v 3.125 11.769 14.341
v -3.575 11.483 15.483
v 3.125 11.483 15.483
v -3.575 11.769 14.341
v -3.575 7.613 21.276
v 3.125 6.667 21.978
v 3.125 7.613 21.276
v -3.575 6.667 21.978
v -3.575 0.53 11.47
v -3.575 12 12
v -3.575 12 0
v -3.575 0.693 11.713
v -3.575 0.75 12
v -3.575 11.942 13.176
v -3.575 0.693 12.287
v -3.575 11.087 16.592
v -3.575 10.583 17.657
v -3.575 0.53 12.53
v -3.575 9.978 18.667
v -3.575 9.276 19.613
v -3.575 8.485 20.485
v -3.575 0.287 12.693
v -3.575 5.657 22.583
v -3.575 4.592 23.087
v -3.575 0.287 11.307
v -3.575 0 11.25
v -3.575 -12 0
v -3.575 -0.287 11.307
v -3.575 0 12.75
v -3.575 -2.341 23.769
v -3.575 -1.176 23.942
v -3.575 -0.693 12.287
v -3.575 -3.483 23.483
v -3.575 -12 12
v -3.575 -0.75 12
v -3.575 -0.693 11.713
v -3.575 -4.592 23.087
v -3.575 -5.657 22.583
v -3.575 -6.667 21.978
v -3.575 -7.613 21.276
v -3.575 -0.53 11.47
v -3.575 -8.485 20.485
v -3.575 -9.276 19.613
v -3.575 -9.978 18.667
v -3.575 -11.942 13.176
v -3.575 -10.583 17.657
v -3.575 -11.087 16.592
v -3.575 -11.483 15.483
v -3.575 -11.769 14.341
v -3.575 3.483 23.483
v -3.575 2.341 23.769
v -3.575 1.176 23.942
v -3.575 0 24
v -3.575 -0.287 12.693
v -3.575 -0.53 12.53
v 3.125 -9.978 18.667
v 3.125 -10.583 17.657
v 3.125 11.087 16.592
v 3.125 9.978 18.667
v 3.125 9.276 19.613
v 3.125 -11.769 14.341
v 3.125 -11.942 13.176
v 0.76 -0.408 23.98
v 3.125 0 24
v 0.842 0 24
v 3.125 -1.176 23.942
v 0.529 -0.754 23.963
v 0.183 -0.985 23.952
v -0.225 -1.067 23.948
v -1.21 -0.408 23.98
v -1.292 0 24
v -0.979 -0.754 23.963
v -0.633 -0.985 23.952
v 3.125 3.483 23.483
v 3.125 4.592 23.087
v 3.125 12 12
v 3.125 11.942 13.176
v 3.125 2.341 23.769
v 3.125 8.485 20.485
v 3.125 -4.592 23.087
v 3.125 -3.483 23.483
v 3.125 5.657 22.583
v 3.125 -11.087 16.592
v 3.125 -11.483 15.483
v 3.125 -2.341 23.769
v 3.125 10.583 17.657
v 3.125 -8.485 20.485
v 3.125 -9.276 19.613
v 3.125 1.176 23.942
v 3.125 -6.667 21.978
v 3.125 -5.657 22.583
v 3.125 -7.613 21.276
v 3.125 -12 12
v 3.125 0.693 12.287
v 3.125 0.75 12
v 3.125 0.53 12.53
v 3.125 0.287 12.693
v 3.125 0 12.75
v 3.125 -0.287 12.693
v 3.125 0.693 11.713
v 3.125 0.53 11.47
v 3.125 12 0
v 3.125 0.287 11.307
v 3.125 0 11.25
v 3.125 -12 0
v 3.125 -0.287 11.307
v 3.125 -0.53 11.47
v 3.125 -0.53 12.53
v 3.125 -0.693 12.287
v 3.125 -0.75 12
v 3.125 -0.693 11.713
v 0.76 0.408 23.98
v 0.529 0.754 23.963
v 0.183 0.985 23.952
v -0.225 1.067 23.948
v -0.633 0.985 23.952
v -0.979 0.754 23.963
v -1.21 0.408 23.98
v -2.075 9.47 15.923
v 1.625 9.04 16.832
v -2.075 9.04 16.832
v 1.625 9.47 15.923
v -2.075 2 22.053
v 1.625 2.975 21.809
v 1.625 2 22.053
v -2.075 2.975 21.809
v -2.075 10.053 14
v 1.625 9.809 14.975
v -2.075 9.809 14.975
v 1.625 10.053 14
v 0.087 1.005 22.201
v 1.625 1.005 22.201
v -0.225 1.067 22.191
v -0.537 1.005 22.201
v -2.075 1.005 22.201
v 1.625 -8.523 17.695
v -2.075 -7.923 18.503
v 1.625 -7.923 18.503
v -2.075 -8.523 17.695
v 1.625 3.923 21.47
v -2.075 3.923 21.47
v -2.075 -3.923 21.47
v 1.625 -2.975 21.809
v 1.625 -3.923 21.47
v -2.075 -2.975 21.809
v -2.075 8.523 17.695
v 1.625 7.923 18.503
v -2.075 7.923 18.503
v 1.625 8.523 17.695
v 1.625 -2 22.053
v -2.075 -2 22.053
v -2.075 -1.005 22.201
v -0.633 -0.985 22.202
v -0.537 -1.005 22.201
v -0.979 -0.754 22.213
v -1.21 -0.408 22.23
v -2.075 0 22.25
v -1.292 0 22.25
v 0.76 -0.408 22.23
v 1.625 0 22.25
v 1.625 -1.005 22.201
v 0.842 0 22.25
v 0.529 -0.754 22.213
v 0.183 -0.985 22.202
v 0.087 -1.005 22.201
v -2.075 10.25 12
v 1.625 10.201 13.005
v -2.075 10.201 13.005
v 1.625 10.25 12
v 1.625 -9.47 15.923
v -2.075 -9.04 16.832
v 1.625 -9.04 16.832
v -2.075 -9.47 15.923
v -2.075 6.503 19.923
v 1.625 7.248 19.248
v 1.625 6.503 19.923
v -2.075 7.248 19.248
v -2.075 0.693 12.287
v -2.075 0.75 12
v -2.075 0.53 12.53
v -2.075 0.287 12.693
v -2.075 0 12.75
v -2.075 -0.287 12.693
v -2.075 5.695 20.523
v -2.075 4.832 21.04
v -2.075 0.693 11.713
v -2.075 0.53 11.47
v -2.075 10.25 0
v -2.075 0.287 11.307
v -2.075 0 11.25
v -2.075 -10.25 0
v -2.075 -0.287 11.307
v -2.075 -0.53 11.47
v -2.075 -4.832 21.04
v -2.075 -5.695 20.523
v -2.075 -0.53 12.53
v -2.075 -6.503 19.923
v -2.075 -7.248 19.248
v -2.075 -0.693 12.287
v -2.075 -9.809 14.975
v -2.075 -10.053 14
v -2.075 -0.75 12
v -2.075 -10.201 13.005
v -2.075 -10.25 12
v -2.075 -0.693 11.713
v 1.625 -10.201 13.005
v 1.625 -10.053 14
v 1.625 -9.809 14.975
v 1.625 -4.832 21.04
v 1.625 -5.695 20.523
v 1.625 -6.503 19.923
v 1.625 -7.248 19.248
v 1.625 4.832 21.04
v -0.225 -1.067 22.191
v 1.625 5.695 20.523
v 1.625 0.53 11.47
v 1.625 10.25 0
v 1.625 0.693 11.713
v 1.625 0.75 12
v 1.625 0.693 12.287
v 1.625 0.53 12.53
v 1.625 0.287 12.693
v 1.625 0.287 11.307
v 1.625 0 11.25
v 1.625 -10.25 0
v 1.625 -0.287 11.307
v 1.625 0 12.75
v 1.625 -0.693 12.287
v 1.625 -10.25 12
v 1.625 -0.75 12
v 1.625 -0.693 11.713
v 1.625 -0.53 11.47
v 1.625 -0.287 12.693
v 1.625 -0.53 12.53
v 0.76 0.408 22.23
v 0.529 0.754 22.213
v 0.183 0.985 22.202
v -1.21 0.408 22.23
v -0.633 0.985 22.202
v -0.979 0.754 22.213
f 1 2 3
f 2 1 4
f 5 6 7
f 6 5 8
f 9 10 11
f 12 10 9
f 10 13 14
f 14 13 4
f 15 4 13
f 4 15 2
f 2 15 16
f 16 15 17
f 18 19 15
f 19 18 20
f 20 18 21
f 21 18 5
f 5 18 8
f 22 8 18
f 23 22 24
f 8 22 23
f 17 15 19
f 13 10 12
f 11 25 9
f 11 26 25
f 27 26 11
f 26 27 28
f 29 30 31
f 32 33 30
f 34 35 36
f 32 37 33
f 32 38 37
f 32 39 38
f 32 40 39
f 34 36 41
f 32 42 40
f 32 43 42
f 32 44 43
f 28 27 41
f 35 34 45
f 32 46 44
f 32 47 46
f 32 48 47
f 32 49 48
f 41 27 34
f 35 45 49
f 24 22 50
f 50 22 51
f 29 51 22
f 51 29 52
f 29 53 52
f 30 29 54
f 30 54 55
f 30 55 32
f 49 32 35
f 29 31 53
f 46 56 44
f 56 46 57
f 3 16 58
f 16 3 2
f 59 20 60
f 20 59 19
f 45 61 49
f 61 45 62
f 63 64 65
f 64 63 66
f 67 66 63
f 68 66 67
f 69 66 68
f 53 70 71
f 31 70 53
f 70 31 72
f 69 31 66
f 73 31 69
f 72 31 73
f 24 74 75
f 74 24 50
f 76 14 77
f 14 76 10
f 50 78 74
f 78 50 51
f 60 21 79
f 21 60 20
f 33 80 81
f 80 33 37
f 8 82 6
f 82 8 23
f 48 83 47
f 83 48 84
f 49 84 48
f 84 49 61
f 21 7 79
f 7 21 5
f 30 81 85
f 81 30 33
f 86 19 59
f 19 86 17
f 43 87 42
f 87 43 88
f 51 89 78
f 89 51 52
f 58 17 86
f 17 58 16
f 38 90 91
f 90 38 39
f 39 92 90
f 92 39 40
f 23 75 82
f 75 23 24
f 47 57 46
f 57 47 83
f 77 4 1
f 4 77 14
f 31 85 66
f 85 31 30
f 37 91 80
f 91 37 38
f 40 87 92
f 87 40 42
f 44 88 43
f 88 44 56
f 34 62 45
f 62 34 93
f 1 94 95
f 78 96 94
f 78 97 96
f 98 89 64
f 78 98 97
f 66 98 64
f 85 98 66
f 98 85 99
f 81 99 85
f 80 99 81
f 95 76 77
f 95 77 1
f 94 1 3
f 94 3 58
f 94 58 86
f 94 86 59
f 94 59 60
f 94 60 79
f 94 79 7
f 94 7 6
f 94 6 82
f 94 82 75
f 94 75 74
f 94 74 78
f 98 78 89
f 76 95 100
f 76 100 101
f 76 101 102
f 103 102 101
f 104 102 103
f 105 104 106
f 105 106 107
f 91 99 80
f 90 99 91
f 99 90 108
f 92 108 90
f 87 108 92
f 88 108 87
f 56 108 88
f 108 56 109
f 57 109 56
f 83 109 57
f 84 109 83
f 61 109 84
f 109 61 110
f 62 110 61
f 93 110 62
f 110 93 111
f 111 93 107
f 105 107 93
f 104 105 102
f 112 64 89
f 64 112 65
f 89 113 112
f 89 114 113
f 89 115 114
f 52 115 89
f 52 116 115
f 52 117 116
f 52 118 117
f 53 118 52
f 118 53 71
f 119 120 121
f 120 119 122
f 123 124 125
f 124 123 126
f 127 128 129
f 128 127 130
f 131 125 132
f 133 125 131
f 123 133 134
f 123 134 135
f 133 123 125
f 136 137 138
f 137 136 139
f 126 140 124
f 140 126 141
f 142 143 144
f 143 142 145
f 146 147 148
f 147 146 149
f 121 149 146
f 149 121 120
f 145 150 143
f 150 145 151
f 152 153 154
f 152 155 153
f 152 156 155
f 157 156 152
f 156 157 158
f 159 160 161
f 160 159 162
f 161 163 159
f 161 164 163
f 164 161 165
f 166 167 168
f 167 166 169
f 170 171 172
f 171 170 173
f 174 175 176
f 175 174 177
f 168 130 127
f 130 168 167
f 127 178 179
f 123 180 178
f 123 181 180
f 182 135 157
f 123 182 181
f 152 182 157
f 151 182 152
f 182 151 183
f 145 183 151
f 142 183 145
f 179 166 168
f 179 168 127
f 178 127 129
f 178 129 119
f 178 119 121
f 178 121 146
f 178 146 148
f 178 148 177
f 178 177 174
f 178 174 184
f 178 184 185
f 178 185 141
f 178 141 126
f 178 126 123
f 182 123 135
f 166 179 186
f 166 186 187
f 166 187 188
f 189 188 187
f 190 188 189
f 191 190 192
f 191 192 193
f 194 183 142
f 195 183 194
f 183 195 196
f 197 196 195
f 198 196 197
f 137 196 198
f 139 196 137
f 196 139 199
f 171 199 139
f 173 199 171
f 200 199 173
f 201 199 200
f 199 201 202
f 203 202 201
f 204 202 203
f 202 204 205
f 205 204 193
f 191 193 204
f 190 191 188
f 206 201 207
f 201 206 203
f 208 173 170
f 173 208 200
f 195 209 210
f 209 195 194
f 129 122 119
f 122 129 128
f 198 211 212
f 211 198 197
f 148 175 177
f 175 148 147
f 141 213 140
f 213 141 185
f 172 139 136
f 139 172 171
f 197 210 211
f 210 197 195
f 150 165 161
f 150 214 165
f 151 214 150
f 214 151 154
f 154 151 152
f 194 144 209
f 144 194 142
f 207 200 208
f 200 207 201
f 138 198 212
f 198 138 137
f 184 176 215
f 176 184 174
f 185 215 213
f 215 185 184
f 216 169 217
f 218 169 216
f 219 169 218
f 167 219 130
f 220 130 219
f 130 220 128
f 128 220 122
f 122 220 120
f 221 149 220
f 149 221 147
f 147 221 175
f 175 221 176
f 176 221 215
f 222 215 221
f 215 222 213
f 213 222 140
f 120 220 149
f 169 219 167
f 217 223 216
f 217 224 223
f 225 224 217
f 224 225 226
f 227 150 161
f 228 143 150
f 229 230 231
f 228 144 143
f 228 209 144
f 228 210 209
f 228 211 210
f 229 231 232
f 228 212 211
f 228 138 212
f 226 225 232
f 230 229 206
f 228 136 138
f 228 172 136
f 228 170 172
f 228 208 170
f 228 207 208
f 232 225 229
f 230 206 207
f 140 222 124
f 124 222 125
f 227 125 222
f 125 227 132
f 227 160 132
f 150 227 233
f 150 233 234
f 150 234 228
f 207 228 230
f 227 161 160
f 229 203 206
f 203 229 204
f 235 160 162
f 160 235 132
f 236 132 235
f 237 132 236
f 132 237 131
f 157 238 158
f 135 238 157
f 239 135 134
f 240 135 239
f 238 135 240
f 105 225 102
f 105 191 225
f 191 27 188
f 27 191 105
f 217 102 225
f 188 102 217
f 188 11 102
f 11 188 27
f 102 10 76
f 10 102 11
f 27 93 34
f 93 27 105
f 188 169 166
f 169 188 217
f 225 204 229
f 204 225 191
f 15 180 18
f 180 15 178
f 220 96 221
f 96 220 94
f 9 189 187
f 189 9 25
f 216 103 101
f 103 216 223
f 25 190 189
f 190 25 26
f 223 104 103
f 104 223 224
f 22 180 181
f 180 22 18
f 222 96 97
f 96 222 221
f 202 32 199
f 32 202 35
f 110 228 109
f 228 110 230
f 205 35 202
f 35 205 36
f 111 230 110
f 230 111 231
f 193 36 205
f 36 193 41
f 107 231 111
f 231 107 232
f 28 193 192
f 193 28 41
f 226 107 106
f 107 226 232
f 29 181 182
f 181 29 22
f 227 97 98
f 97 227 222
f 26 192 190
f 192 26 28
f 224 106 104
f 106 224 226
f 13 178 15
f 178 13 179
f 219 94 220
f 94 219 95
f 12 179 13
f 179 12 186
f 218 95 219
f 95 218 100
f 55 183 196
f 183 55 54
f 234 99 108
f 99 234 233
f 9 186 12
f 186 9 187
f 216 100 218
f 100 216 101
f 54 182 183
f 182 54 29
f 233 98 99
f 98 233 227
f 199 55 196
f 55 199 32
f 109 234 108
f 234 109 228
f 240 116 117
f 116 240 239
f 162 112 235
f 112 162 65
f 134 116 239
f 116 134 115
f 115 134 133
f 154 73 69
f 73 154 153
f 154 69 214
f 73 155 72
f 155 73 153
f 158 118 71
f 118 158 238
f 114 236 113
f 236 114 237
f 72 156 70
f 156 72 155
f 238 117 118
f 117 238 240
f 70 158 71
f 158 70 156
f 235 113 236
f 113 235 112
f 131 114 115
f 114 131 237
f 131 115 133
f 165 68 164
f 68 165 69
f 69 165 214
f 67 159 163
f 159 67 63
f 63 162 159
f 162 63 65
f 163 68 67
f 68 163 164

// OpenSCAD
/*Battery dimensions in mm
CR1225 cell holder: 
 diameter=12mm 
 height=2.5mm 
 tolerance=0.5mm 
 wall thickness=2mm 

CR2032 cell holder: 
 diameter=20mm 
 height=3.2mm 
 tolerance=0.5mm 
 wall thickness=2mm 
*/

battery_diameter	=20.0;	// Diameter of battery
battery_height		=3.2;	// Thickness of battery
tolerance			=0.5;	// Make things a little looser
wall_thickness		=1.5;	// Wall thickness
wire_diameter		=1.5;	// Thickness of wire openings
extra_length		=2.0;	// Extends the open outwards to "hide" the battery a little bit
number_of_cells	=1;		// How many cells will be stacked

rotate([0,90,0])
{
	// Move to propper hieght and orientation
	translate([-battery_diameter/2-extra_length,0,-(battery_height*number_of_cells)-(wall_thickness/4)])
	{
		difference()
		{
			union()
			{
				difference()
				{
					// Main block
					cylinder(r=(battery_diameter/2)+tolerance+wall_thickness, h=battery_height*number_of_cells+(tolerance)+(2*wall_thickness),$fn=64);
					// Battery shape
					translate([0,0,wall_thickness])
						cylinder(r=(battery_diameter/2)+(tolerance/2), h=battery_height*number_of_cells+tolerance,$fn=64);
					// Square opening 
					translate([0,-((battery_diameter/2)+2+tolerance),0])
						cube([battery_diameter+10,battery_diameter*number_of_cells+5,battery_height*number_of_cells+5]);
				}
				difference()
				{
					// Square extension
					translate([0,-((battery_diameter/2)+wall_thickness+tolerance),0])
						cube([battery_diameter/2+extra_length,battery_diameter+(2*wall_thickness)+(2*tolerance),battery_height*number_of_cells+(2*wall_thickness)+tolerance]);
					// Square hole in end
					translate([0,-((battery_diameter/2))-(tolerance/2),wall_thickness])
						cube([battery_diameter+tolerance,battery_diameter+tolerance,battery_height*number_of_cells+tolerance]);
				}
			}
			// Wire holes
			translate([0,0,-1])
				cylinder(r=wire_diameter/2, h=battery_height*number_of_cells+tolerance+10,$fn=16);
			// Battery "push out" hole
			translate([-battery_diameter/2-wall_thickness-1,0,wall_thickness+(battery_height*number_of_cells/2)+tolerance/2])
				rotate([0,90,0])
					cylinder(r=battery_height/3,h=wall_thickness+1,$fn=16);
		}
	}
}
